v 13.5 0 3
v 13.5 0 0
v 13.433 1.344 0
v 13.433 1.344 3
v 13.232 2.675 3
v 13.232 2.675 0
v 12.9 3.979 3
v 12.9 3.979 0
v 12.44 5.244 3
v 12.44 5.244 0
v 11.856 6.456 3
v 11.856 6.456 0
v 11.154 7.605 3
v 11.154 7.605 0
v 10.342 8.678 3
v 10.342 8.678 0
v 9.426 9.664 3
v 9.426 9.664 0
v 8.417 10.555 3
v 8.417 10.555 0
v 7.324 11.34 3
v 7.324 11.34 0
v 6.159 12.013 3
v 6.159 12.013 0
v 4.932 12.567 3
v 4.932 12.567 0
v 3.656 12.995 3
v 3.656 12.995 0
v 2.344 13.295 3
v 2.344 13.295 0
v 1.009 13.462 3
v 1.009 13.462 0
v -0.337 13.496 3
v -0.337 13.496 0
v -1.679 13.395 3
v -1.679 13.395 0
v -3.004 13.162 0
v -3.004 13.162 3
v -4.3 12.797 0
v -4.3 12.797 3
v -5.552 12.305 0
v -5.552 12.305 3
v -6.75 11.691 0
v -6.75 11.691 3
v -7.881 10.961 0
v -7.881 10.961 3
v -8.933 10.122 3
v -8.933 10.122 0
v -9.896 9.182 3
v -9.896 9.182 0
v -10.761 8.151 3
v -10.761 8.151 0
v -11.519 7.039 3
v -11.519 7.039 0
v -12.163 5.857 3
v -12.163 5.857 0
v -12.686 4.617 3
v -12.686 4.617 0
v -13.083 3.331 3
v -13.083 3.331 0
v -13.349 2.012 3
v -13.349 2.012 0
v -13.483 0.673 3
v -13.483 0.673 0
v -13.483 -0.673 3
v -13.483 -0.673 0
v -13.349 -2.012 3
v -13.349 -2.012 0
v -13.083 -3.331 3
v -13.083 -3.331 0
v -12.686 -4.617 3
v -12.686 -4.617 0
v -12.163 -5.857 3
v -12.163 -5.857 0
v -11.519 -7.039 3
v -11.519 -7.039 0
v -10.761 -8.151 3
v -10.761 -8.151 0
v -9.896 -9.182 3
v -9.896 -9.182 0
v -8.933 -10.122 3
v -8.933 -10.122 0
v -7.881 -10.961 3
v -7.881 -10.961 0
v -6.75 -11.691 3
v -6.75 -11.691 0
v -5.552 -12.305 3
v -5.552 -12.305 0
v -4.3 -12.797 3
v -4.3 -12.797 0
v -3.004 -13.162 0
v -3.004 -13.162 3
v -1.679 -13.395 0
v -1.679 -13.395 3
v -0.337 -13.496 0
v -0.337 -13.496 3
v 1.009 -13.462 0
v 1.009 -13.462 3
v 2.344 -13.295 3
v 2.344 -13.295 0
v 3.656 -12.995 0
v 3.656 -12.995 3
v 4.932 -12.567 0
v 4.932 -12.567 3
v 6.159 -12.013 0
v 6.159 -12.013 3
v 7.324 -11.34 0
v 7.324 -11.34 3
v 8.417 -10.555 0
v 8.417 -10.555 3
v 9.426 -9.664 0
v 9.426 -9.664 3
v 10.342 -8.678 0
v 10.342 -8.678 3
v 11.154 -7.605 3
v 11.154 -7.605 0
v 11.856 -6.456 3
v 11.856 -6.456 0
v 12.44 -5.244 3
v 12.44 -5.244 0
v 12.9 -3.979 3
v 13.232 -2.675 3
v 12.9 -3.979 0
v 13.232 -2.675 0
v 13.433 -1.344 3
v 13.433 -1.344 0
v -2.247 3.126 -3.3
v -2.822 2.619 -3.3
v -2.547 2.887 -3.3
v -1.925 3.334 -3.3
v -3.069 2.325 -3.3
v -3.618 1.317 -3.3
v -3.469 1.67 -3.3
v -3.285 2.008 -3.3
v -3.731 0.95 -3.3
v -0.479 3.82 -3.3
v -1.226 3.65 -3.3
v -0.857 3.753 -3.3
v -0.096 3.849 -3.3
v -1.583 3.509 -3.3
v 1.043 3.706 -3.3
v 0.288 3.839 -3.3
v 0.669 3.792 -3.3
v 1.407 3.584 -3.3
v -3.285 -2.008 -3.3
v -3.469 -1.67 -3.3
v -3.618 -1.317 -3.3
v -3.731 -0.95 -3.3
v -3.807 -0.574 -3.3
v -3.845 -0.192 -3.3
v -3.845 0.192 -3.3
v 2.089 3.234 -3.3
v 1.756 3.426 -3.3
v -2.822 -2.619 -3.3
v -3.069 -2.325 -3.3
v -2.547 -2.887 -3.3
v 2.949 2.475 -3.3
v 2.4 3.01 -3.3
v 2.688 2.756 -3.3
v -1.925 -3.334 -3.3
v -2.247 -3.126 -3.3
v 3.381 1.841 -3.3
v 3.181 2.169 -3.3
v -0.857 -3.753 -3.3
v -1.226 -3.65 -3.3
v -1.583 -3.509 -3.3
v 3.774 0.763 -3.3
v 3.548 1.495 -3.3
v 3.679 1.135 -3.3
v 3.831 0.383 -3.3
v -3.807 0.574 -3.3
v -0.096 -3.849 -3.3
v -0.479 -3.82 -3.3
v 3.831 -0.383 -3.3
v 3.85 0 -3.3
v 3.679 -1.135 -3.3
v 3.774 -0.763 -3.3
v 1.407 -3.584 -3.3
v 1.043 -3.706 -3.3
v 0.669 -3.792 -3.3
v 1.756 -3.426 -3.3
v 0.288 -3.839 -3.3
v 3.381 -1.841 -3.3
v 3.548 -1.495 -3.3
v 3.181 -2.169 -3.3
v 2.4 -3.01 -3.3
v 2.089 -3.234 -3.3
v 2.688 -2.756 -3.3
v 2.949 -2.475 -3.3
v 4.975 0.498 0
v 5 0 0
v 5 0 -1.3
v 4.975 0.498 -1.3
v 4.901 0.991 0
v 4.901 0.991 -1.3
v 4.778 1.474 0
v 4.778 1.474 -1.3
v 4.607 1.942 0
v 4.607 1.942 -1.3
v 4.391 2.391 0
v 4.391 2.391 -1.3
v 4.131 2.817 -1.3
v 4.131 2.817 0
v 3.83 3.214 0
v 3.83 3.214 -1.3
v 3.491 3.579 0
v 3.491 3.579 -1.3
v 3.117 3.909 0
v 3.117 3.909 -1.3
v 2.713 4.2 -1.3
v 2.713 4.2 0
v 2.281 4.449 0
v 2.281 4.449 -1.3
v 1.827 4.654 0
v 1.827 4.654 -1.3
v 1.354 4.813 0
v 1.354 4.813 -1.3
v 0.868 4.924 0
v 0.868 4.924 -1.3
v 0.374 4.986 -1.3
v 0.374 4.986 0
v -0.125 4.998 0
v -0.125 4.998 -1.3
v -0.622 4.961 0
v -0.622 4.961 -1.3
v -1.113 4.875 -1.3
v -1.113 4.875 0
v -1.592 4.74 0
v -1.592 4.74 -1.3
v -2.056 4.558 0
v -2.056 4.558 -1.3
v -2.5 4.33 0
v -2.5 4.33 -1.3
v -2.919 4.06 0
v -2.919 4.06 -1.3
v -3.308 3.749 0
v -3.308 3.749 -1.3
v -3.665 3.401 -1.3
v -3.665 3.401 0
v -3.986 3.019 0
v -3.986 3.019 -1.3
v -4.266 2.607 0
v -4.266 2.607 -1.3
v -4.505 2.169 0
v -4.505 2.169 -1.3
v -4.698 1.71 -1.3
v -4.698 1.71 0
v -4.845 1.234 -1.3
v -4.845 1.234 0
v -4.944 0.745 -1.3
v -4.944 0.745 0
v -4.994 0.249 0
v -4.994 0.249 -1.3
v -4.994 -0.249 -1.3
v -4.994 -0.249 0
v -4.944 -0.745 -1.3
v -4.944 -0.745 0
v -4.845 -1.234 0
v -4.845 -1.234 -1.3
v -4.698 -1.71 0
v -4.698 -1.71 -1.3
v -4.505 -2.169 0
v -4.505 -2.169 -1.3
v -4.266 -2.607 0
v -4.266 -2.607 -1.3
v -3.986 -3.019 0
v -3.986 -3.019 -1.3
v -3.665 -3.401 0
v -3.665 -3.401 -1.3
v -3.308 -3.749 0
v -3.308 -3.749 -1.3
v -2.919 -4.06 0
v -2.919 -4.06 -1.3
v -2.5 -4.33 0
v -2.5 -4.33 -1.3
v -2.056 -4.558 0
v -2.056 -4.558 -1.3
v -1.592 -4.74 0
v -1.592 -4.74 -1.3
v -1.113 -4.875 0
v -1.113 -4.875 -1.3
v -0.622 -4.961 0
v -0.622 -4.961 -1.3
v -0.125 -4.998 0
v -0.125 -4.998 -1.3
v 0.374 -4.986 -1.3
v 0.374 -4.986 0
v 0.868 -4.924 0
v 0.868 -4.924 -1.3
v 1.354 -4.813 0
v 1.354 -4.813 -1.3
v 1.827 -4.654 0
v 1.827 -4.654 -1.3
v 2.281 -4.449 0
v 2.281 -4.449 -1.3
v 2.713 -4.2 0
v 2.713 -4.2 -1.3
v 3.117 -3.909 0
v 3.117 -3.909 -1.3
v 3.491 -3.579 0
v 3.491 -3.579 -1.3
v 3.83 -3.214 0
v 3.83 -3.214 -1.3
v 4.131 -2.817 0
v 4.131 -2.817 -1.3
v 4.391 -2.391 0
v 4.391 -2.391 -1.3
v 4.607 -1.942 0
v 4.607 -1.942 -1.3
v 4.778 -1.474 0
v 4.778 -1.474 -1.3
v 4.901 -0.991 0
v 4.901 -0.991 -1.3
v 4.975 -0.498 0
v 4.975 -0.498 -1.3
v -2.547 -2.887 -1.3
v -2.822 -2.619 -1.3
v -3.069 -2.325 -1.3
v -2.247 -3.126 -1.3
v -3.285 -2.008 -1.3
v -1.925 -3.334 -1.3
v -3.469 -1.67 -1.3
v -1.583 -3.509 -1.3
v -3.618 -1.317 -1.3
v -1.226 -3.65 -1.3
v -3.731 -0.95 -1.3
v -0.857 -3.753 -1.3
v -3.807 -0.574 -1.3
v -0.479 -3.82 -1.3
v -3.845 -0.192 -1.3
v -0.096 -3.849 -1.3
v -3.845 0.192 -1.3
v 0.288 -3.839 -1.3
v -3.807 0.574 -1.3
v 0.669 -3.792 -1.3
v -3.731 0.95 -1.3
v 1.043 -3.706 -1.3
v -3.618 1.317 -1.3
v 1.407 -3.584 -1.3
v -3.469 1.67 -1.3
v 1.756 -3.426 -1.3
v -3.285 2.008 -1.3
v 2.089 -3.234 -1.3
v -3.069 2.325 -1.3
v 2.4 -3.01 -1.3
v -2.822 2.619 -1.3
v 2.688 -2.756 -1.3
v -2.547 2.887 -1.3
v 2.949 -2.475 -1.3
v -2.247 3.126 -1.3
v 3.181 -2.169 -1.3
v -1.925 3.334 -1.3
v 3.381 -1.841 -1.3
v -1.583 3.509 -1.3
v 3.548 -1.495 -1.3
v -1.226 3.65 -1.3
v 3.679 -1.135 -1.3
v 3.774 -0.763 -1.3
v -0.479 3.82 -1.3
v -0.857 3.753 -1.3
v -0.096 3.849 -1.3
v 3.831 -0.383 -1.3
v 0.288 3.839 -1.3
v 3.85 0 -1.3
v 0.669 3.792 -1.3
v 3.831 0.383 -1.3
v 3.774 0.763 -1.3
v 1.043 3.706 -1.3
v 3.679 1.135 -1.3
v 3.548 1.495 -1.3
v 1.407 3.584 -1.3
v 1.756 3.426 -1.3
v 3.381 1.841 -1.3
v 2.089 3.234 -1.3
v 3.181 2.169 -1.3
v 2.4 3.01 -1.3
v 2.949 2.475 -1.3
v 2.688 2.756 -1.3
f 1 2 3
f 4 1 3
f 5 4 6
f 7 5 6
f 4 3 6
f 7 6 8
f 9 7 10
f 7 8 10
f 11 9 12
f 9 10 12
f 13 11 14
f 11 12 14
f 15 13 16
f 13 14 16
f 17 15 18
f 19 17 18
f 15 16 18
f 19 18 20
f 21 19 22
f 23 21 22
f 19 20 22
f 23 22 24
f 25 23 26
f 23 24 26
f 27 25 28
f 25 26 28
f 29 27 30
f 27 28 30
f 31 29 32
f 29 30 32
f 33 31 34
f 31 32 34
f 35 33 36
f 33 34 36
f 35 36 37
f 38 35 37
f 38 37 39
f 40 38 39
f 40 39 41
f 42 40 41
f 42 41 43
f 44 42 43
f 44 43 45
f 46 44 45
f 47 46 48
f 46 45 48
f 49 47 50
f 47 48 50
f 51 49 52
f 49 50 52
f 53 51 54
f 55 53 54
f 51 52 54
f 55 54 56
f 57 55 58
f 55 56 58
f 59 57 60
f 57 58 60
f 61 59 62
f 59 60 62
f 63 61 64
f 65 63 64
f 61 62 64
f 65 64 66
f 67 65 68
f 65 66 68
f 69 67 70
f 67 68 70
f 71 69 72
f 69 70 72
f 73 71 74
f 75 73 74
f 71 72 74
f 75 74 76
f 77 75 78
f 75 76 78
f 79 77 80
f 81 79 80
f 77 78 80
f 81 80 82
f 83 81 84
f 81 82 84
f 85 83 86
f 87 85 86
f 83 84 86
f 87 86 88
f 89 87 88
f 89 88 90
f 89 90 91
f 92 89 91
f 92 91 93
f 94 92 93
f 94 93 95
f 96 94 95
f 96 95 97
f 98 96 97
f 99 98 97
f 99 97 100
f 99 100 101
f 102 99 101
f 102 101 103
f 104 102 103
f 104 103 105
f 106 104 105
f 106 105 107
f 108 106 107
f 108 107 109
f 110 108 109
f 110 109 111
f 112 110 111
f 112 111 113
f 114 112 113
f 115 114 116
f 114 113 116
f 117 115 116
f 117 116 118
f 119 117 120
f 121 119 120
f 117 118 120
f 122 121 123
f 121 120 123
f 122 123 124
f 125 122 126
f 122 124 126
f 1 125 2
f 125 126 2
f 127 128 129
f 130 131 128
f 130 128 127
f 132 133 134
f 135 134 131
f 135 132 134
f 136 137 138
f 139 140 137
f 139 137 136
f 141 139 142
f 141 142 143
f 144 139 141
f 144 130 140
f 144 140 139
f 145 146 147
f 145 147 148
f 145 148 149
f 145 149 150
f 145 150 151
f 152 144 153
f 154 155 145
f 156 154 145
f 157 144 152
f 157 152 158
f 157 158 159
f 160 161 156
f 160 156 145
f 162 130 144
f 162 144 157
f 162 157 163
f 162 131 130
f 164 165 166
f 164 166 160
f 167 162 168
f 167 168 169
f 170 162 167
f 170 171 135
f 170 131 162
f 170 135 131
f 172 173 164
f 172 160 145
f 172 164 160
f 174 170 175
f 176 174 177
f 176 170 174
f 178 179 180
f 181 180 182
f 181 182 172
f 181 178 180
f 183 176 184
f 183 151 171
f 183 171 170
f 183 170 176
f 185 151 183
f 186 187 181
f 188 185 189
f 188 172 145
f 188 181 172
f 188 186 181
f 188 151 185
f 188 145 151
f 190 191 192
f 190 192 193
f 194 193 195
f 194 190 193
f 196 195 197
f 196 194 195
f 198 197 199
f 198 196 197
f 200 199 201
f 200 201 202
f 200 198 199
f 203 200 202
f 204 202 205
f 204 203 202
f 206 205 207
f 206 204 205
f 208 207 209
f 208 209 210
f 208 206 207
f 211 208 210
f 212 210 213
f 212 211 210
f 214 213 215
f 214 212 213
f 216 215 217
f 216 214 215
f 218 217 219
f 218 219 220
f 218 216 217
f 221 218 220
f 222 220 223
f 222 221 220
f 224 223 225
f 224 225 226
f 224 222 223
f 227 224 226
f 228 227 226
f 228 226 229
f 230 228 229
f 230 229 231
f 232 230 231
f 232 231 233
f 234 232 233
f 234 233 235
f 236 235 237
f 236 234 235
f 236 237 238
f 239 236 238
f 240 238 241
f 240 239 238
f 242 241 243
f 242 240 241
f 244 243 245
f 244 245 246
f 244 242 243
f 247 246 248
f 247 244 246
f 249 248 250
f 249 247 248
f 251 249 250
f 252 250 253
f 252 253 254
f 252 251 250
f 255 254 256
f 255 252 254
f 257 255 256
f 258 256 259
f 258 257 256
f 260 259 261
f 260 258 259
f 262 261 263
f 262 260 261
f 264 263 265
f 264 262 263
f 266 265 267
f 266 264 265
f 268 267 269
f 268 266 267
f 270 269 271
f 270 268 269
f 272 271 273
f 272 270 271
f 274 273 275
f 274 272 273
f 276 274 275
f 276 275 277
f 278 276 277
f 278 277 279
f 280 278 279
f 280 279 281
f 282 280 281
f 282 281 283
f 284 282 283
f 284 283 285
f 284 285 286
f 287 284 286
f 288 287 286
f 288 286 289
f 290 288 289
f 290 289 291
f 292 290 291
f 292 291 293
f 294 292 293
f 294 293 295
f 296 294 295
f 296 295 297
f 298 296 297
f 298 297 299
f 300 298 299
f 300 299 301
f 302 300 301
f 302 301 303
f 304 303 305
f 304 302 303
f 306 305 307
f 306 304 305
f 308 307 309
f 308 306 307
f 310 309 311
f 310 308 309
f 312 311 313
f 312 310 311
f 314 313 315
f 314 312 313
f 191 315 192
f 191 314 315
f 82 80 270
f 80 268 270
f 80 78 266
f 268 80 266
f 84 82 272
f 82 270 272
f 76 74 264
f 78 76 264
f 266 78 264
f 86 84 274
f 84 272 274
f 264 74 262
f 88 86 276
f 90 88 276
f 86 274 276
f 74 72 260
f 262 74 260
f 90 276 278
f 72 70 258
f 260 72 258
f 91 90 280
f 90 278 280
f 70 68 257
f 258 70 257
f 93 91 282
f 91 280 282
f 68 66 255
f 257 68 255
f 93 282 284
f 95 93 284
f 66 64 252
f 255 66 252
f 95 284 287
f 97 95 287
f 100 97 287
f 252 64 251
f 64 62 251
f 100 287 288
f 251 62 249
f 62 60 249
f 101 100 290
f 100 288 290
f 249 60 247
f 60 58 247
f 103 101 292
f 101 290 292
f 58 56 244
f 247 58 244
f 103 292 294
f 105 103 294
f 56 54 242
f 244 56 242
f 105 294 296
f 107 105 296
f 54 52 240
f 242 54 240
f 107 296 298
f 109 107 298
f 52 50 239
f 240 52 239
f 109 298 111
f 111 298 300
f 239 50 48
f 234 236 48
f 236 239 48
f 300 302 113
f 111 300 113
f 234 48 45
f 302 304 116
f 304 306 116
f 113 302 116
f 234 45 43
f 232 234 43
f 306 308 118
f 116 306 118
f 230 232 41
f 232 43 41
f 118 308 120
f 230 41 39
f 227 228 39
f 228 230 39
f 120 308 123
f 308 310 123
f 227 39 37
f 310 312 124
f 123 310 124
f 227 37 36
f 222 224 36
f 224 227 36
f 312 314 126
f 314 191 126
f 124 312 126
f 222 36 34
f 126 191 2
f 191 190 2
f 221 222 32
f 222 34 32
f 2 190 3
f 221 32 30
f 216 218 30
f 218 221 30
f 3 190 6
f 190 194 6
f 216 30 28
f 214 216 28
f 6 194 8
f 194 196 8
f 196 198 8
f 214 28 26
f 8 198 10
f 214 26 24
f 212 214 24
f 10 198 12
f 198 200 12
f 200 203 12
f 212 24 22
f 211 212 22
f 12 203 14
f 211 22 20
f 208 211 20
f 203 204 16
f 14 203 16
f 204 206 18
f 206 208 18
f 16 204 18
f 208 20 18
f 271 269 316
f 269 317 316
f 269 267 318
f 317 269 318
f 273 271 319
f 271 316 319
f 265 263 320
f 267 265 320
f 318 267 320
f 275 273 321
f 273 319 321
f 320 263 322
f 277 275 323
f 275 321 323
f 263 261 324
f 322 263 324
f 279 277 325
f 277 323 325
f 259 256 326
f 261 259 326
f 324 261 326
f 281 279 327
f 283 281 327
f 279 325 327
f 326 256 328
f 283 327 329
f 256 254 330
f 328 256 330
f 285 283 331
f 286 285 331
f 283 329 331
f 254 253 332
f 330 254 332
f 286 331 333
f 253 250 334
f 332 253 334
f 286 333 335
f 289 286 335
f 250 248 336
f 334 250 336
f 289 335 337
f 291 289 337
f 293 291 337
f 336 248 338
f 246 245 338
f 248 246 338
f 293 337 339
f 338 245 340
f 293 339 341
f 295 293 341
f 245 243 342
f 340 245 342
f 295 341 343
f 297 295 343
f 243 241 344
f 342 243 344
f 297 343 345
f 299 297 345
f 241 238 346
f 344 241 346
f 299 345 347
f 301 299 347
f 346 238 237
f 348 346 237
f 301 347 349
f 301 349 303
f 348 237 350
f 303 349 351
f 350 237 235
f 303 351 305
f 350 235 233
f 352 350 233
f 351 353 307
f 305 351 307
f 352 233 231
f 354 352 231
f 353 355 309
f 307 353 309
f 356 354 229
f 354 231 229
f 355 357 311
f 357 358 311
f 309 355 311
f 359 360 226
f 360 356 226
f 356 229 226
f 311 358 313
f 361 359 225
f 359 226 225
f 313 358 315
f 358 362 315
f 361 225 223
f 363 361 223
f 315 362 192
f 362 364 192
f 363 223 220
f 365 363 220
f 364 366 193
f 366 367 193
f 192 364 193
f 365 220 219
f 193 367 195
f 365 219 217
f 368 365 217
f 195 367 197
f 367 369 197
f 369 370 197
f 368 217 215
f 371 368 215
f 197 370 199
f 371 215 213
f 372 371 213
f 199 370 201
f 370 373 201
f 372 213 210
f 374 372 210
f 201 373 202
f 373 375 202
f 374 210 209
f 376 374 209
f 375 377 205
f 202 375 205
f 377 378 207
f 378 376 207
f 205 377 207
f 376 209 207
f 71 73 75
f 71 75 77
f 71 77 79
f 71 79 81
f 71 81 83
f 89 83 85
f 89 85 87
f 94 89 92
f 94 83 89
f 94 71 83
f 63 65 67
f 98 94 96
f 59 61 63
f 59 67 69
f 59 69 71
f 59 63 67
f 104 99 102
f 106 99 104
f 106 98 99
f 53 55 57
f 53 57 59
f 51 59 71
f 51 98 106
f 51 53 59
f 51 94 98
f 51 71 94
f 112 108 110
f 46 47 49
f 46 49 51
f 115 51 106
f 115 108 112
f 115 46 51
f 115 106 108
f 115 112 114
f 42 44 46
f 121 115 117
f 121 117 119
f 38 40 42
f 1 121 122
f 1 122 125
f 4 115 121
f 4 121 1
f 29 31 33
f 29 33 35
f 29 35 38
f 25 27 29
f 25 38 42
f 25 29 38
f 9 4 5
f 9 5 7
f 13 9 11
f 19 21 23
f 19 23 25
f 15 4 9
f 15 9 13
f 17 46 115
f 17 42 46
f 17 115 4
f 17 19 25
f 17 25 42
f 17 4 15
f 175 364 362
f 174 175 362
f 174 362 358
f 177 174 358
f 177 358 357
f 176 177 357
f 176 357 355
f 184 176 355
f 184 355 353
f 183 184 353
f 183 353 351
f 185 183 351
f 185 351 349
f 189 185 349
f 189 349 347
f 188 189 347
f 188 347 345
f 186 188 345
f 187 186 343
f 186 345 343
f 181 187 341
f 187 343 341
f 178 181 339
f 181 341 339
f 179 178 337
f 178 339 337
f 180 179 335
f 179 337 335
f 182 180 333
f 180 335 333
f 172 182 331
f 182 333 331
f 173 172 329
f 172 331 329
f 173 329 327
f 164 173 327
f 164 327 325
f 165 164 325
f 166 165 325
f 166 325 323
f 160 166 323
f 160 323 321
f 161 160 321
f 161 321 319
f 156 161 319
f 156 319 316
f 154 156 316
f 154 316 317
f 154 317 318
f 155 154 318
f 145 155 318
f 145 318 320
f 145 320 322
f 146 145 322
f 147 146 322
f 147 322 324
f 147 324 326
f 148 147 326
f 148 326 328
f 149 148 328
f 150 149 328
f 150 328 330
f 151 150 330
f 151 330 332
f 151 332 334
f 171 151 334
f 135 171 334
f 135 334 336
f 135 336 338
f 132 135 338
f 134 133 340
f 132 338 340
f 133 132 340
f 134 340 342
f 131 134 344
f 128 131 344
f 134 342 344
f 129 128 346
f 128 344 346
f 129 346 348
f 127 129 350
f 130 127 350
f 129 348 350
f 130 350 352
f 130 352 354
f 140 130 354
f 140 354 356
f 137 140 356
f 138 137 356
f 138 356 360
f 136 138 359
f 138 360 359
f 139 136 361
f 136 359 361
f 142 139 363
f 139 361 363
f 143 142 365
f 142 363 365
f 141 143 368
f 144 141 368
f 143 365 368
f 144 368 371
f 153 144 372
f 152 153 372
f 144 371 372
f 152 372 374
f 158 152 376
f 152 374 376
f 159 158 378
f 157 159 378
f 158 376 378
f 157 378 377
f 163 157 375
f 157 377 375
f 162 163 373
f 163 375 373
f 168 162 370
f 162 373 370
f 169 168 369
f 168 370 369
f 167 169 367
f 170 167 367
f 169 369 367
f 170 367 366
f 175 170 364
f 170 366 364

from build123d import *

# Parameters (mm, degrees)
F0_R      = 13.5
F1_DEPTH  = 3
F2_R      = 5
F2_R_2    = 3.85
F3_DEPTH  = 1.3
F3_FACE_R = 3.85
F4_DEPTH  = 3.3


with BuildPart() as f1:
    # F0 (on Top) → F1 (new body)
    with BuildSketch(Plane.XY):
        Circle(F0_R)
    extrude(amount=F1_DEPTH)

    # F2 (on Top) → F3 (join)
    with BuildSketch(Plane.XY):
        Circle(F2_R)
        Circle(F2_R_2, mode=Mode.SUBTRACT)
    extrude(amount=-F3_DEPTH)

    # F3_face (on face) → F4 (join)
    with BuildSketch(Plane(origin=(0, 0, 0), x_dir=(1, 0, 0), z_dir=(0, 0, -1))):
        Circle(F3_FACE_R)
    extrude(amount=F4_DEPTH)


solid = f1.part
